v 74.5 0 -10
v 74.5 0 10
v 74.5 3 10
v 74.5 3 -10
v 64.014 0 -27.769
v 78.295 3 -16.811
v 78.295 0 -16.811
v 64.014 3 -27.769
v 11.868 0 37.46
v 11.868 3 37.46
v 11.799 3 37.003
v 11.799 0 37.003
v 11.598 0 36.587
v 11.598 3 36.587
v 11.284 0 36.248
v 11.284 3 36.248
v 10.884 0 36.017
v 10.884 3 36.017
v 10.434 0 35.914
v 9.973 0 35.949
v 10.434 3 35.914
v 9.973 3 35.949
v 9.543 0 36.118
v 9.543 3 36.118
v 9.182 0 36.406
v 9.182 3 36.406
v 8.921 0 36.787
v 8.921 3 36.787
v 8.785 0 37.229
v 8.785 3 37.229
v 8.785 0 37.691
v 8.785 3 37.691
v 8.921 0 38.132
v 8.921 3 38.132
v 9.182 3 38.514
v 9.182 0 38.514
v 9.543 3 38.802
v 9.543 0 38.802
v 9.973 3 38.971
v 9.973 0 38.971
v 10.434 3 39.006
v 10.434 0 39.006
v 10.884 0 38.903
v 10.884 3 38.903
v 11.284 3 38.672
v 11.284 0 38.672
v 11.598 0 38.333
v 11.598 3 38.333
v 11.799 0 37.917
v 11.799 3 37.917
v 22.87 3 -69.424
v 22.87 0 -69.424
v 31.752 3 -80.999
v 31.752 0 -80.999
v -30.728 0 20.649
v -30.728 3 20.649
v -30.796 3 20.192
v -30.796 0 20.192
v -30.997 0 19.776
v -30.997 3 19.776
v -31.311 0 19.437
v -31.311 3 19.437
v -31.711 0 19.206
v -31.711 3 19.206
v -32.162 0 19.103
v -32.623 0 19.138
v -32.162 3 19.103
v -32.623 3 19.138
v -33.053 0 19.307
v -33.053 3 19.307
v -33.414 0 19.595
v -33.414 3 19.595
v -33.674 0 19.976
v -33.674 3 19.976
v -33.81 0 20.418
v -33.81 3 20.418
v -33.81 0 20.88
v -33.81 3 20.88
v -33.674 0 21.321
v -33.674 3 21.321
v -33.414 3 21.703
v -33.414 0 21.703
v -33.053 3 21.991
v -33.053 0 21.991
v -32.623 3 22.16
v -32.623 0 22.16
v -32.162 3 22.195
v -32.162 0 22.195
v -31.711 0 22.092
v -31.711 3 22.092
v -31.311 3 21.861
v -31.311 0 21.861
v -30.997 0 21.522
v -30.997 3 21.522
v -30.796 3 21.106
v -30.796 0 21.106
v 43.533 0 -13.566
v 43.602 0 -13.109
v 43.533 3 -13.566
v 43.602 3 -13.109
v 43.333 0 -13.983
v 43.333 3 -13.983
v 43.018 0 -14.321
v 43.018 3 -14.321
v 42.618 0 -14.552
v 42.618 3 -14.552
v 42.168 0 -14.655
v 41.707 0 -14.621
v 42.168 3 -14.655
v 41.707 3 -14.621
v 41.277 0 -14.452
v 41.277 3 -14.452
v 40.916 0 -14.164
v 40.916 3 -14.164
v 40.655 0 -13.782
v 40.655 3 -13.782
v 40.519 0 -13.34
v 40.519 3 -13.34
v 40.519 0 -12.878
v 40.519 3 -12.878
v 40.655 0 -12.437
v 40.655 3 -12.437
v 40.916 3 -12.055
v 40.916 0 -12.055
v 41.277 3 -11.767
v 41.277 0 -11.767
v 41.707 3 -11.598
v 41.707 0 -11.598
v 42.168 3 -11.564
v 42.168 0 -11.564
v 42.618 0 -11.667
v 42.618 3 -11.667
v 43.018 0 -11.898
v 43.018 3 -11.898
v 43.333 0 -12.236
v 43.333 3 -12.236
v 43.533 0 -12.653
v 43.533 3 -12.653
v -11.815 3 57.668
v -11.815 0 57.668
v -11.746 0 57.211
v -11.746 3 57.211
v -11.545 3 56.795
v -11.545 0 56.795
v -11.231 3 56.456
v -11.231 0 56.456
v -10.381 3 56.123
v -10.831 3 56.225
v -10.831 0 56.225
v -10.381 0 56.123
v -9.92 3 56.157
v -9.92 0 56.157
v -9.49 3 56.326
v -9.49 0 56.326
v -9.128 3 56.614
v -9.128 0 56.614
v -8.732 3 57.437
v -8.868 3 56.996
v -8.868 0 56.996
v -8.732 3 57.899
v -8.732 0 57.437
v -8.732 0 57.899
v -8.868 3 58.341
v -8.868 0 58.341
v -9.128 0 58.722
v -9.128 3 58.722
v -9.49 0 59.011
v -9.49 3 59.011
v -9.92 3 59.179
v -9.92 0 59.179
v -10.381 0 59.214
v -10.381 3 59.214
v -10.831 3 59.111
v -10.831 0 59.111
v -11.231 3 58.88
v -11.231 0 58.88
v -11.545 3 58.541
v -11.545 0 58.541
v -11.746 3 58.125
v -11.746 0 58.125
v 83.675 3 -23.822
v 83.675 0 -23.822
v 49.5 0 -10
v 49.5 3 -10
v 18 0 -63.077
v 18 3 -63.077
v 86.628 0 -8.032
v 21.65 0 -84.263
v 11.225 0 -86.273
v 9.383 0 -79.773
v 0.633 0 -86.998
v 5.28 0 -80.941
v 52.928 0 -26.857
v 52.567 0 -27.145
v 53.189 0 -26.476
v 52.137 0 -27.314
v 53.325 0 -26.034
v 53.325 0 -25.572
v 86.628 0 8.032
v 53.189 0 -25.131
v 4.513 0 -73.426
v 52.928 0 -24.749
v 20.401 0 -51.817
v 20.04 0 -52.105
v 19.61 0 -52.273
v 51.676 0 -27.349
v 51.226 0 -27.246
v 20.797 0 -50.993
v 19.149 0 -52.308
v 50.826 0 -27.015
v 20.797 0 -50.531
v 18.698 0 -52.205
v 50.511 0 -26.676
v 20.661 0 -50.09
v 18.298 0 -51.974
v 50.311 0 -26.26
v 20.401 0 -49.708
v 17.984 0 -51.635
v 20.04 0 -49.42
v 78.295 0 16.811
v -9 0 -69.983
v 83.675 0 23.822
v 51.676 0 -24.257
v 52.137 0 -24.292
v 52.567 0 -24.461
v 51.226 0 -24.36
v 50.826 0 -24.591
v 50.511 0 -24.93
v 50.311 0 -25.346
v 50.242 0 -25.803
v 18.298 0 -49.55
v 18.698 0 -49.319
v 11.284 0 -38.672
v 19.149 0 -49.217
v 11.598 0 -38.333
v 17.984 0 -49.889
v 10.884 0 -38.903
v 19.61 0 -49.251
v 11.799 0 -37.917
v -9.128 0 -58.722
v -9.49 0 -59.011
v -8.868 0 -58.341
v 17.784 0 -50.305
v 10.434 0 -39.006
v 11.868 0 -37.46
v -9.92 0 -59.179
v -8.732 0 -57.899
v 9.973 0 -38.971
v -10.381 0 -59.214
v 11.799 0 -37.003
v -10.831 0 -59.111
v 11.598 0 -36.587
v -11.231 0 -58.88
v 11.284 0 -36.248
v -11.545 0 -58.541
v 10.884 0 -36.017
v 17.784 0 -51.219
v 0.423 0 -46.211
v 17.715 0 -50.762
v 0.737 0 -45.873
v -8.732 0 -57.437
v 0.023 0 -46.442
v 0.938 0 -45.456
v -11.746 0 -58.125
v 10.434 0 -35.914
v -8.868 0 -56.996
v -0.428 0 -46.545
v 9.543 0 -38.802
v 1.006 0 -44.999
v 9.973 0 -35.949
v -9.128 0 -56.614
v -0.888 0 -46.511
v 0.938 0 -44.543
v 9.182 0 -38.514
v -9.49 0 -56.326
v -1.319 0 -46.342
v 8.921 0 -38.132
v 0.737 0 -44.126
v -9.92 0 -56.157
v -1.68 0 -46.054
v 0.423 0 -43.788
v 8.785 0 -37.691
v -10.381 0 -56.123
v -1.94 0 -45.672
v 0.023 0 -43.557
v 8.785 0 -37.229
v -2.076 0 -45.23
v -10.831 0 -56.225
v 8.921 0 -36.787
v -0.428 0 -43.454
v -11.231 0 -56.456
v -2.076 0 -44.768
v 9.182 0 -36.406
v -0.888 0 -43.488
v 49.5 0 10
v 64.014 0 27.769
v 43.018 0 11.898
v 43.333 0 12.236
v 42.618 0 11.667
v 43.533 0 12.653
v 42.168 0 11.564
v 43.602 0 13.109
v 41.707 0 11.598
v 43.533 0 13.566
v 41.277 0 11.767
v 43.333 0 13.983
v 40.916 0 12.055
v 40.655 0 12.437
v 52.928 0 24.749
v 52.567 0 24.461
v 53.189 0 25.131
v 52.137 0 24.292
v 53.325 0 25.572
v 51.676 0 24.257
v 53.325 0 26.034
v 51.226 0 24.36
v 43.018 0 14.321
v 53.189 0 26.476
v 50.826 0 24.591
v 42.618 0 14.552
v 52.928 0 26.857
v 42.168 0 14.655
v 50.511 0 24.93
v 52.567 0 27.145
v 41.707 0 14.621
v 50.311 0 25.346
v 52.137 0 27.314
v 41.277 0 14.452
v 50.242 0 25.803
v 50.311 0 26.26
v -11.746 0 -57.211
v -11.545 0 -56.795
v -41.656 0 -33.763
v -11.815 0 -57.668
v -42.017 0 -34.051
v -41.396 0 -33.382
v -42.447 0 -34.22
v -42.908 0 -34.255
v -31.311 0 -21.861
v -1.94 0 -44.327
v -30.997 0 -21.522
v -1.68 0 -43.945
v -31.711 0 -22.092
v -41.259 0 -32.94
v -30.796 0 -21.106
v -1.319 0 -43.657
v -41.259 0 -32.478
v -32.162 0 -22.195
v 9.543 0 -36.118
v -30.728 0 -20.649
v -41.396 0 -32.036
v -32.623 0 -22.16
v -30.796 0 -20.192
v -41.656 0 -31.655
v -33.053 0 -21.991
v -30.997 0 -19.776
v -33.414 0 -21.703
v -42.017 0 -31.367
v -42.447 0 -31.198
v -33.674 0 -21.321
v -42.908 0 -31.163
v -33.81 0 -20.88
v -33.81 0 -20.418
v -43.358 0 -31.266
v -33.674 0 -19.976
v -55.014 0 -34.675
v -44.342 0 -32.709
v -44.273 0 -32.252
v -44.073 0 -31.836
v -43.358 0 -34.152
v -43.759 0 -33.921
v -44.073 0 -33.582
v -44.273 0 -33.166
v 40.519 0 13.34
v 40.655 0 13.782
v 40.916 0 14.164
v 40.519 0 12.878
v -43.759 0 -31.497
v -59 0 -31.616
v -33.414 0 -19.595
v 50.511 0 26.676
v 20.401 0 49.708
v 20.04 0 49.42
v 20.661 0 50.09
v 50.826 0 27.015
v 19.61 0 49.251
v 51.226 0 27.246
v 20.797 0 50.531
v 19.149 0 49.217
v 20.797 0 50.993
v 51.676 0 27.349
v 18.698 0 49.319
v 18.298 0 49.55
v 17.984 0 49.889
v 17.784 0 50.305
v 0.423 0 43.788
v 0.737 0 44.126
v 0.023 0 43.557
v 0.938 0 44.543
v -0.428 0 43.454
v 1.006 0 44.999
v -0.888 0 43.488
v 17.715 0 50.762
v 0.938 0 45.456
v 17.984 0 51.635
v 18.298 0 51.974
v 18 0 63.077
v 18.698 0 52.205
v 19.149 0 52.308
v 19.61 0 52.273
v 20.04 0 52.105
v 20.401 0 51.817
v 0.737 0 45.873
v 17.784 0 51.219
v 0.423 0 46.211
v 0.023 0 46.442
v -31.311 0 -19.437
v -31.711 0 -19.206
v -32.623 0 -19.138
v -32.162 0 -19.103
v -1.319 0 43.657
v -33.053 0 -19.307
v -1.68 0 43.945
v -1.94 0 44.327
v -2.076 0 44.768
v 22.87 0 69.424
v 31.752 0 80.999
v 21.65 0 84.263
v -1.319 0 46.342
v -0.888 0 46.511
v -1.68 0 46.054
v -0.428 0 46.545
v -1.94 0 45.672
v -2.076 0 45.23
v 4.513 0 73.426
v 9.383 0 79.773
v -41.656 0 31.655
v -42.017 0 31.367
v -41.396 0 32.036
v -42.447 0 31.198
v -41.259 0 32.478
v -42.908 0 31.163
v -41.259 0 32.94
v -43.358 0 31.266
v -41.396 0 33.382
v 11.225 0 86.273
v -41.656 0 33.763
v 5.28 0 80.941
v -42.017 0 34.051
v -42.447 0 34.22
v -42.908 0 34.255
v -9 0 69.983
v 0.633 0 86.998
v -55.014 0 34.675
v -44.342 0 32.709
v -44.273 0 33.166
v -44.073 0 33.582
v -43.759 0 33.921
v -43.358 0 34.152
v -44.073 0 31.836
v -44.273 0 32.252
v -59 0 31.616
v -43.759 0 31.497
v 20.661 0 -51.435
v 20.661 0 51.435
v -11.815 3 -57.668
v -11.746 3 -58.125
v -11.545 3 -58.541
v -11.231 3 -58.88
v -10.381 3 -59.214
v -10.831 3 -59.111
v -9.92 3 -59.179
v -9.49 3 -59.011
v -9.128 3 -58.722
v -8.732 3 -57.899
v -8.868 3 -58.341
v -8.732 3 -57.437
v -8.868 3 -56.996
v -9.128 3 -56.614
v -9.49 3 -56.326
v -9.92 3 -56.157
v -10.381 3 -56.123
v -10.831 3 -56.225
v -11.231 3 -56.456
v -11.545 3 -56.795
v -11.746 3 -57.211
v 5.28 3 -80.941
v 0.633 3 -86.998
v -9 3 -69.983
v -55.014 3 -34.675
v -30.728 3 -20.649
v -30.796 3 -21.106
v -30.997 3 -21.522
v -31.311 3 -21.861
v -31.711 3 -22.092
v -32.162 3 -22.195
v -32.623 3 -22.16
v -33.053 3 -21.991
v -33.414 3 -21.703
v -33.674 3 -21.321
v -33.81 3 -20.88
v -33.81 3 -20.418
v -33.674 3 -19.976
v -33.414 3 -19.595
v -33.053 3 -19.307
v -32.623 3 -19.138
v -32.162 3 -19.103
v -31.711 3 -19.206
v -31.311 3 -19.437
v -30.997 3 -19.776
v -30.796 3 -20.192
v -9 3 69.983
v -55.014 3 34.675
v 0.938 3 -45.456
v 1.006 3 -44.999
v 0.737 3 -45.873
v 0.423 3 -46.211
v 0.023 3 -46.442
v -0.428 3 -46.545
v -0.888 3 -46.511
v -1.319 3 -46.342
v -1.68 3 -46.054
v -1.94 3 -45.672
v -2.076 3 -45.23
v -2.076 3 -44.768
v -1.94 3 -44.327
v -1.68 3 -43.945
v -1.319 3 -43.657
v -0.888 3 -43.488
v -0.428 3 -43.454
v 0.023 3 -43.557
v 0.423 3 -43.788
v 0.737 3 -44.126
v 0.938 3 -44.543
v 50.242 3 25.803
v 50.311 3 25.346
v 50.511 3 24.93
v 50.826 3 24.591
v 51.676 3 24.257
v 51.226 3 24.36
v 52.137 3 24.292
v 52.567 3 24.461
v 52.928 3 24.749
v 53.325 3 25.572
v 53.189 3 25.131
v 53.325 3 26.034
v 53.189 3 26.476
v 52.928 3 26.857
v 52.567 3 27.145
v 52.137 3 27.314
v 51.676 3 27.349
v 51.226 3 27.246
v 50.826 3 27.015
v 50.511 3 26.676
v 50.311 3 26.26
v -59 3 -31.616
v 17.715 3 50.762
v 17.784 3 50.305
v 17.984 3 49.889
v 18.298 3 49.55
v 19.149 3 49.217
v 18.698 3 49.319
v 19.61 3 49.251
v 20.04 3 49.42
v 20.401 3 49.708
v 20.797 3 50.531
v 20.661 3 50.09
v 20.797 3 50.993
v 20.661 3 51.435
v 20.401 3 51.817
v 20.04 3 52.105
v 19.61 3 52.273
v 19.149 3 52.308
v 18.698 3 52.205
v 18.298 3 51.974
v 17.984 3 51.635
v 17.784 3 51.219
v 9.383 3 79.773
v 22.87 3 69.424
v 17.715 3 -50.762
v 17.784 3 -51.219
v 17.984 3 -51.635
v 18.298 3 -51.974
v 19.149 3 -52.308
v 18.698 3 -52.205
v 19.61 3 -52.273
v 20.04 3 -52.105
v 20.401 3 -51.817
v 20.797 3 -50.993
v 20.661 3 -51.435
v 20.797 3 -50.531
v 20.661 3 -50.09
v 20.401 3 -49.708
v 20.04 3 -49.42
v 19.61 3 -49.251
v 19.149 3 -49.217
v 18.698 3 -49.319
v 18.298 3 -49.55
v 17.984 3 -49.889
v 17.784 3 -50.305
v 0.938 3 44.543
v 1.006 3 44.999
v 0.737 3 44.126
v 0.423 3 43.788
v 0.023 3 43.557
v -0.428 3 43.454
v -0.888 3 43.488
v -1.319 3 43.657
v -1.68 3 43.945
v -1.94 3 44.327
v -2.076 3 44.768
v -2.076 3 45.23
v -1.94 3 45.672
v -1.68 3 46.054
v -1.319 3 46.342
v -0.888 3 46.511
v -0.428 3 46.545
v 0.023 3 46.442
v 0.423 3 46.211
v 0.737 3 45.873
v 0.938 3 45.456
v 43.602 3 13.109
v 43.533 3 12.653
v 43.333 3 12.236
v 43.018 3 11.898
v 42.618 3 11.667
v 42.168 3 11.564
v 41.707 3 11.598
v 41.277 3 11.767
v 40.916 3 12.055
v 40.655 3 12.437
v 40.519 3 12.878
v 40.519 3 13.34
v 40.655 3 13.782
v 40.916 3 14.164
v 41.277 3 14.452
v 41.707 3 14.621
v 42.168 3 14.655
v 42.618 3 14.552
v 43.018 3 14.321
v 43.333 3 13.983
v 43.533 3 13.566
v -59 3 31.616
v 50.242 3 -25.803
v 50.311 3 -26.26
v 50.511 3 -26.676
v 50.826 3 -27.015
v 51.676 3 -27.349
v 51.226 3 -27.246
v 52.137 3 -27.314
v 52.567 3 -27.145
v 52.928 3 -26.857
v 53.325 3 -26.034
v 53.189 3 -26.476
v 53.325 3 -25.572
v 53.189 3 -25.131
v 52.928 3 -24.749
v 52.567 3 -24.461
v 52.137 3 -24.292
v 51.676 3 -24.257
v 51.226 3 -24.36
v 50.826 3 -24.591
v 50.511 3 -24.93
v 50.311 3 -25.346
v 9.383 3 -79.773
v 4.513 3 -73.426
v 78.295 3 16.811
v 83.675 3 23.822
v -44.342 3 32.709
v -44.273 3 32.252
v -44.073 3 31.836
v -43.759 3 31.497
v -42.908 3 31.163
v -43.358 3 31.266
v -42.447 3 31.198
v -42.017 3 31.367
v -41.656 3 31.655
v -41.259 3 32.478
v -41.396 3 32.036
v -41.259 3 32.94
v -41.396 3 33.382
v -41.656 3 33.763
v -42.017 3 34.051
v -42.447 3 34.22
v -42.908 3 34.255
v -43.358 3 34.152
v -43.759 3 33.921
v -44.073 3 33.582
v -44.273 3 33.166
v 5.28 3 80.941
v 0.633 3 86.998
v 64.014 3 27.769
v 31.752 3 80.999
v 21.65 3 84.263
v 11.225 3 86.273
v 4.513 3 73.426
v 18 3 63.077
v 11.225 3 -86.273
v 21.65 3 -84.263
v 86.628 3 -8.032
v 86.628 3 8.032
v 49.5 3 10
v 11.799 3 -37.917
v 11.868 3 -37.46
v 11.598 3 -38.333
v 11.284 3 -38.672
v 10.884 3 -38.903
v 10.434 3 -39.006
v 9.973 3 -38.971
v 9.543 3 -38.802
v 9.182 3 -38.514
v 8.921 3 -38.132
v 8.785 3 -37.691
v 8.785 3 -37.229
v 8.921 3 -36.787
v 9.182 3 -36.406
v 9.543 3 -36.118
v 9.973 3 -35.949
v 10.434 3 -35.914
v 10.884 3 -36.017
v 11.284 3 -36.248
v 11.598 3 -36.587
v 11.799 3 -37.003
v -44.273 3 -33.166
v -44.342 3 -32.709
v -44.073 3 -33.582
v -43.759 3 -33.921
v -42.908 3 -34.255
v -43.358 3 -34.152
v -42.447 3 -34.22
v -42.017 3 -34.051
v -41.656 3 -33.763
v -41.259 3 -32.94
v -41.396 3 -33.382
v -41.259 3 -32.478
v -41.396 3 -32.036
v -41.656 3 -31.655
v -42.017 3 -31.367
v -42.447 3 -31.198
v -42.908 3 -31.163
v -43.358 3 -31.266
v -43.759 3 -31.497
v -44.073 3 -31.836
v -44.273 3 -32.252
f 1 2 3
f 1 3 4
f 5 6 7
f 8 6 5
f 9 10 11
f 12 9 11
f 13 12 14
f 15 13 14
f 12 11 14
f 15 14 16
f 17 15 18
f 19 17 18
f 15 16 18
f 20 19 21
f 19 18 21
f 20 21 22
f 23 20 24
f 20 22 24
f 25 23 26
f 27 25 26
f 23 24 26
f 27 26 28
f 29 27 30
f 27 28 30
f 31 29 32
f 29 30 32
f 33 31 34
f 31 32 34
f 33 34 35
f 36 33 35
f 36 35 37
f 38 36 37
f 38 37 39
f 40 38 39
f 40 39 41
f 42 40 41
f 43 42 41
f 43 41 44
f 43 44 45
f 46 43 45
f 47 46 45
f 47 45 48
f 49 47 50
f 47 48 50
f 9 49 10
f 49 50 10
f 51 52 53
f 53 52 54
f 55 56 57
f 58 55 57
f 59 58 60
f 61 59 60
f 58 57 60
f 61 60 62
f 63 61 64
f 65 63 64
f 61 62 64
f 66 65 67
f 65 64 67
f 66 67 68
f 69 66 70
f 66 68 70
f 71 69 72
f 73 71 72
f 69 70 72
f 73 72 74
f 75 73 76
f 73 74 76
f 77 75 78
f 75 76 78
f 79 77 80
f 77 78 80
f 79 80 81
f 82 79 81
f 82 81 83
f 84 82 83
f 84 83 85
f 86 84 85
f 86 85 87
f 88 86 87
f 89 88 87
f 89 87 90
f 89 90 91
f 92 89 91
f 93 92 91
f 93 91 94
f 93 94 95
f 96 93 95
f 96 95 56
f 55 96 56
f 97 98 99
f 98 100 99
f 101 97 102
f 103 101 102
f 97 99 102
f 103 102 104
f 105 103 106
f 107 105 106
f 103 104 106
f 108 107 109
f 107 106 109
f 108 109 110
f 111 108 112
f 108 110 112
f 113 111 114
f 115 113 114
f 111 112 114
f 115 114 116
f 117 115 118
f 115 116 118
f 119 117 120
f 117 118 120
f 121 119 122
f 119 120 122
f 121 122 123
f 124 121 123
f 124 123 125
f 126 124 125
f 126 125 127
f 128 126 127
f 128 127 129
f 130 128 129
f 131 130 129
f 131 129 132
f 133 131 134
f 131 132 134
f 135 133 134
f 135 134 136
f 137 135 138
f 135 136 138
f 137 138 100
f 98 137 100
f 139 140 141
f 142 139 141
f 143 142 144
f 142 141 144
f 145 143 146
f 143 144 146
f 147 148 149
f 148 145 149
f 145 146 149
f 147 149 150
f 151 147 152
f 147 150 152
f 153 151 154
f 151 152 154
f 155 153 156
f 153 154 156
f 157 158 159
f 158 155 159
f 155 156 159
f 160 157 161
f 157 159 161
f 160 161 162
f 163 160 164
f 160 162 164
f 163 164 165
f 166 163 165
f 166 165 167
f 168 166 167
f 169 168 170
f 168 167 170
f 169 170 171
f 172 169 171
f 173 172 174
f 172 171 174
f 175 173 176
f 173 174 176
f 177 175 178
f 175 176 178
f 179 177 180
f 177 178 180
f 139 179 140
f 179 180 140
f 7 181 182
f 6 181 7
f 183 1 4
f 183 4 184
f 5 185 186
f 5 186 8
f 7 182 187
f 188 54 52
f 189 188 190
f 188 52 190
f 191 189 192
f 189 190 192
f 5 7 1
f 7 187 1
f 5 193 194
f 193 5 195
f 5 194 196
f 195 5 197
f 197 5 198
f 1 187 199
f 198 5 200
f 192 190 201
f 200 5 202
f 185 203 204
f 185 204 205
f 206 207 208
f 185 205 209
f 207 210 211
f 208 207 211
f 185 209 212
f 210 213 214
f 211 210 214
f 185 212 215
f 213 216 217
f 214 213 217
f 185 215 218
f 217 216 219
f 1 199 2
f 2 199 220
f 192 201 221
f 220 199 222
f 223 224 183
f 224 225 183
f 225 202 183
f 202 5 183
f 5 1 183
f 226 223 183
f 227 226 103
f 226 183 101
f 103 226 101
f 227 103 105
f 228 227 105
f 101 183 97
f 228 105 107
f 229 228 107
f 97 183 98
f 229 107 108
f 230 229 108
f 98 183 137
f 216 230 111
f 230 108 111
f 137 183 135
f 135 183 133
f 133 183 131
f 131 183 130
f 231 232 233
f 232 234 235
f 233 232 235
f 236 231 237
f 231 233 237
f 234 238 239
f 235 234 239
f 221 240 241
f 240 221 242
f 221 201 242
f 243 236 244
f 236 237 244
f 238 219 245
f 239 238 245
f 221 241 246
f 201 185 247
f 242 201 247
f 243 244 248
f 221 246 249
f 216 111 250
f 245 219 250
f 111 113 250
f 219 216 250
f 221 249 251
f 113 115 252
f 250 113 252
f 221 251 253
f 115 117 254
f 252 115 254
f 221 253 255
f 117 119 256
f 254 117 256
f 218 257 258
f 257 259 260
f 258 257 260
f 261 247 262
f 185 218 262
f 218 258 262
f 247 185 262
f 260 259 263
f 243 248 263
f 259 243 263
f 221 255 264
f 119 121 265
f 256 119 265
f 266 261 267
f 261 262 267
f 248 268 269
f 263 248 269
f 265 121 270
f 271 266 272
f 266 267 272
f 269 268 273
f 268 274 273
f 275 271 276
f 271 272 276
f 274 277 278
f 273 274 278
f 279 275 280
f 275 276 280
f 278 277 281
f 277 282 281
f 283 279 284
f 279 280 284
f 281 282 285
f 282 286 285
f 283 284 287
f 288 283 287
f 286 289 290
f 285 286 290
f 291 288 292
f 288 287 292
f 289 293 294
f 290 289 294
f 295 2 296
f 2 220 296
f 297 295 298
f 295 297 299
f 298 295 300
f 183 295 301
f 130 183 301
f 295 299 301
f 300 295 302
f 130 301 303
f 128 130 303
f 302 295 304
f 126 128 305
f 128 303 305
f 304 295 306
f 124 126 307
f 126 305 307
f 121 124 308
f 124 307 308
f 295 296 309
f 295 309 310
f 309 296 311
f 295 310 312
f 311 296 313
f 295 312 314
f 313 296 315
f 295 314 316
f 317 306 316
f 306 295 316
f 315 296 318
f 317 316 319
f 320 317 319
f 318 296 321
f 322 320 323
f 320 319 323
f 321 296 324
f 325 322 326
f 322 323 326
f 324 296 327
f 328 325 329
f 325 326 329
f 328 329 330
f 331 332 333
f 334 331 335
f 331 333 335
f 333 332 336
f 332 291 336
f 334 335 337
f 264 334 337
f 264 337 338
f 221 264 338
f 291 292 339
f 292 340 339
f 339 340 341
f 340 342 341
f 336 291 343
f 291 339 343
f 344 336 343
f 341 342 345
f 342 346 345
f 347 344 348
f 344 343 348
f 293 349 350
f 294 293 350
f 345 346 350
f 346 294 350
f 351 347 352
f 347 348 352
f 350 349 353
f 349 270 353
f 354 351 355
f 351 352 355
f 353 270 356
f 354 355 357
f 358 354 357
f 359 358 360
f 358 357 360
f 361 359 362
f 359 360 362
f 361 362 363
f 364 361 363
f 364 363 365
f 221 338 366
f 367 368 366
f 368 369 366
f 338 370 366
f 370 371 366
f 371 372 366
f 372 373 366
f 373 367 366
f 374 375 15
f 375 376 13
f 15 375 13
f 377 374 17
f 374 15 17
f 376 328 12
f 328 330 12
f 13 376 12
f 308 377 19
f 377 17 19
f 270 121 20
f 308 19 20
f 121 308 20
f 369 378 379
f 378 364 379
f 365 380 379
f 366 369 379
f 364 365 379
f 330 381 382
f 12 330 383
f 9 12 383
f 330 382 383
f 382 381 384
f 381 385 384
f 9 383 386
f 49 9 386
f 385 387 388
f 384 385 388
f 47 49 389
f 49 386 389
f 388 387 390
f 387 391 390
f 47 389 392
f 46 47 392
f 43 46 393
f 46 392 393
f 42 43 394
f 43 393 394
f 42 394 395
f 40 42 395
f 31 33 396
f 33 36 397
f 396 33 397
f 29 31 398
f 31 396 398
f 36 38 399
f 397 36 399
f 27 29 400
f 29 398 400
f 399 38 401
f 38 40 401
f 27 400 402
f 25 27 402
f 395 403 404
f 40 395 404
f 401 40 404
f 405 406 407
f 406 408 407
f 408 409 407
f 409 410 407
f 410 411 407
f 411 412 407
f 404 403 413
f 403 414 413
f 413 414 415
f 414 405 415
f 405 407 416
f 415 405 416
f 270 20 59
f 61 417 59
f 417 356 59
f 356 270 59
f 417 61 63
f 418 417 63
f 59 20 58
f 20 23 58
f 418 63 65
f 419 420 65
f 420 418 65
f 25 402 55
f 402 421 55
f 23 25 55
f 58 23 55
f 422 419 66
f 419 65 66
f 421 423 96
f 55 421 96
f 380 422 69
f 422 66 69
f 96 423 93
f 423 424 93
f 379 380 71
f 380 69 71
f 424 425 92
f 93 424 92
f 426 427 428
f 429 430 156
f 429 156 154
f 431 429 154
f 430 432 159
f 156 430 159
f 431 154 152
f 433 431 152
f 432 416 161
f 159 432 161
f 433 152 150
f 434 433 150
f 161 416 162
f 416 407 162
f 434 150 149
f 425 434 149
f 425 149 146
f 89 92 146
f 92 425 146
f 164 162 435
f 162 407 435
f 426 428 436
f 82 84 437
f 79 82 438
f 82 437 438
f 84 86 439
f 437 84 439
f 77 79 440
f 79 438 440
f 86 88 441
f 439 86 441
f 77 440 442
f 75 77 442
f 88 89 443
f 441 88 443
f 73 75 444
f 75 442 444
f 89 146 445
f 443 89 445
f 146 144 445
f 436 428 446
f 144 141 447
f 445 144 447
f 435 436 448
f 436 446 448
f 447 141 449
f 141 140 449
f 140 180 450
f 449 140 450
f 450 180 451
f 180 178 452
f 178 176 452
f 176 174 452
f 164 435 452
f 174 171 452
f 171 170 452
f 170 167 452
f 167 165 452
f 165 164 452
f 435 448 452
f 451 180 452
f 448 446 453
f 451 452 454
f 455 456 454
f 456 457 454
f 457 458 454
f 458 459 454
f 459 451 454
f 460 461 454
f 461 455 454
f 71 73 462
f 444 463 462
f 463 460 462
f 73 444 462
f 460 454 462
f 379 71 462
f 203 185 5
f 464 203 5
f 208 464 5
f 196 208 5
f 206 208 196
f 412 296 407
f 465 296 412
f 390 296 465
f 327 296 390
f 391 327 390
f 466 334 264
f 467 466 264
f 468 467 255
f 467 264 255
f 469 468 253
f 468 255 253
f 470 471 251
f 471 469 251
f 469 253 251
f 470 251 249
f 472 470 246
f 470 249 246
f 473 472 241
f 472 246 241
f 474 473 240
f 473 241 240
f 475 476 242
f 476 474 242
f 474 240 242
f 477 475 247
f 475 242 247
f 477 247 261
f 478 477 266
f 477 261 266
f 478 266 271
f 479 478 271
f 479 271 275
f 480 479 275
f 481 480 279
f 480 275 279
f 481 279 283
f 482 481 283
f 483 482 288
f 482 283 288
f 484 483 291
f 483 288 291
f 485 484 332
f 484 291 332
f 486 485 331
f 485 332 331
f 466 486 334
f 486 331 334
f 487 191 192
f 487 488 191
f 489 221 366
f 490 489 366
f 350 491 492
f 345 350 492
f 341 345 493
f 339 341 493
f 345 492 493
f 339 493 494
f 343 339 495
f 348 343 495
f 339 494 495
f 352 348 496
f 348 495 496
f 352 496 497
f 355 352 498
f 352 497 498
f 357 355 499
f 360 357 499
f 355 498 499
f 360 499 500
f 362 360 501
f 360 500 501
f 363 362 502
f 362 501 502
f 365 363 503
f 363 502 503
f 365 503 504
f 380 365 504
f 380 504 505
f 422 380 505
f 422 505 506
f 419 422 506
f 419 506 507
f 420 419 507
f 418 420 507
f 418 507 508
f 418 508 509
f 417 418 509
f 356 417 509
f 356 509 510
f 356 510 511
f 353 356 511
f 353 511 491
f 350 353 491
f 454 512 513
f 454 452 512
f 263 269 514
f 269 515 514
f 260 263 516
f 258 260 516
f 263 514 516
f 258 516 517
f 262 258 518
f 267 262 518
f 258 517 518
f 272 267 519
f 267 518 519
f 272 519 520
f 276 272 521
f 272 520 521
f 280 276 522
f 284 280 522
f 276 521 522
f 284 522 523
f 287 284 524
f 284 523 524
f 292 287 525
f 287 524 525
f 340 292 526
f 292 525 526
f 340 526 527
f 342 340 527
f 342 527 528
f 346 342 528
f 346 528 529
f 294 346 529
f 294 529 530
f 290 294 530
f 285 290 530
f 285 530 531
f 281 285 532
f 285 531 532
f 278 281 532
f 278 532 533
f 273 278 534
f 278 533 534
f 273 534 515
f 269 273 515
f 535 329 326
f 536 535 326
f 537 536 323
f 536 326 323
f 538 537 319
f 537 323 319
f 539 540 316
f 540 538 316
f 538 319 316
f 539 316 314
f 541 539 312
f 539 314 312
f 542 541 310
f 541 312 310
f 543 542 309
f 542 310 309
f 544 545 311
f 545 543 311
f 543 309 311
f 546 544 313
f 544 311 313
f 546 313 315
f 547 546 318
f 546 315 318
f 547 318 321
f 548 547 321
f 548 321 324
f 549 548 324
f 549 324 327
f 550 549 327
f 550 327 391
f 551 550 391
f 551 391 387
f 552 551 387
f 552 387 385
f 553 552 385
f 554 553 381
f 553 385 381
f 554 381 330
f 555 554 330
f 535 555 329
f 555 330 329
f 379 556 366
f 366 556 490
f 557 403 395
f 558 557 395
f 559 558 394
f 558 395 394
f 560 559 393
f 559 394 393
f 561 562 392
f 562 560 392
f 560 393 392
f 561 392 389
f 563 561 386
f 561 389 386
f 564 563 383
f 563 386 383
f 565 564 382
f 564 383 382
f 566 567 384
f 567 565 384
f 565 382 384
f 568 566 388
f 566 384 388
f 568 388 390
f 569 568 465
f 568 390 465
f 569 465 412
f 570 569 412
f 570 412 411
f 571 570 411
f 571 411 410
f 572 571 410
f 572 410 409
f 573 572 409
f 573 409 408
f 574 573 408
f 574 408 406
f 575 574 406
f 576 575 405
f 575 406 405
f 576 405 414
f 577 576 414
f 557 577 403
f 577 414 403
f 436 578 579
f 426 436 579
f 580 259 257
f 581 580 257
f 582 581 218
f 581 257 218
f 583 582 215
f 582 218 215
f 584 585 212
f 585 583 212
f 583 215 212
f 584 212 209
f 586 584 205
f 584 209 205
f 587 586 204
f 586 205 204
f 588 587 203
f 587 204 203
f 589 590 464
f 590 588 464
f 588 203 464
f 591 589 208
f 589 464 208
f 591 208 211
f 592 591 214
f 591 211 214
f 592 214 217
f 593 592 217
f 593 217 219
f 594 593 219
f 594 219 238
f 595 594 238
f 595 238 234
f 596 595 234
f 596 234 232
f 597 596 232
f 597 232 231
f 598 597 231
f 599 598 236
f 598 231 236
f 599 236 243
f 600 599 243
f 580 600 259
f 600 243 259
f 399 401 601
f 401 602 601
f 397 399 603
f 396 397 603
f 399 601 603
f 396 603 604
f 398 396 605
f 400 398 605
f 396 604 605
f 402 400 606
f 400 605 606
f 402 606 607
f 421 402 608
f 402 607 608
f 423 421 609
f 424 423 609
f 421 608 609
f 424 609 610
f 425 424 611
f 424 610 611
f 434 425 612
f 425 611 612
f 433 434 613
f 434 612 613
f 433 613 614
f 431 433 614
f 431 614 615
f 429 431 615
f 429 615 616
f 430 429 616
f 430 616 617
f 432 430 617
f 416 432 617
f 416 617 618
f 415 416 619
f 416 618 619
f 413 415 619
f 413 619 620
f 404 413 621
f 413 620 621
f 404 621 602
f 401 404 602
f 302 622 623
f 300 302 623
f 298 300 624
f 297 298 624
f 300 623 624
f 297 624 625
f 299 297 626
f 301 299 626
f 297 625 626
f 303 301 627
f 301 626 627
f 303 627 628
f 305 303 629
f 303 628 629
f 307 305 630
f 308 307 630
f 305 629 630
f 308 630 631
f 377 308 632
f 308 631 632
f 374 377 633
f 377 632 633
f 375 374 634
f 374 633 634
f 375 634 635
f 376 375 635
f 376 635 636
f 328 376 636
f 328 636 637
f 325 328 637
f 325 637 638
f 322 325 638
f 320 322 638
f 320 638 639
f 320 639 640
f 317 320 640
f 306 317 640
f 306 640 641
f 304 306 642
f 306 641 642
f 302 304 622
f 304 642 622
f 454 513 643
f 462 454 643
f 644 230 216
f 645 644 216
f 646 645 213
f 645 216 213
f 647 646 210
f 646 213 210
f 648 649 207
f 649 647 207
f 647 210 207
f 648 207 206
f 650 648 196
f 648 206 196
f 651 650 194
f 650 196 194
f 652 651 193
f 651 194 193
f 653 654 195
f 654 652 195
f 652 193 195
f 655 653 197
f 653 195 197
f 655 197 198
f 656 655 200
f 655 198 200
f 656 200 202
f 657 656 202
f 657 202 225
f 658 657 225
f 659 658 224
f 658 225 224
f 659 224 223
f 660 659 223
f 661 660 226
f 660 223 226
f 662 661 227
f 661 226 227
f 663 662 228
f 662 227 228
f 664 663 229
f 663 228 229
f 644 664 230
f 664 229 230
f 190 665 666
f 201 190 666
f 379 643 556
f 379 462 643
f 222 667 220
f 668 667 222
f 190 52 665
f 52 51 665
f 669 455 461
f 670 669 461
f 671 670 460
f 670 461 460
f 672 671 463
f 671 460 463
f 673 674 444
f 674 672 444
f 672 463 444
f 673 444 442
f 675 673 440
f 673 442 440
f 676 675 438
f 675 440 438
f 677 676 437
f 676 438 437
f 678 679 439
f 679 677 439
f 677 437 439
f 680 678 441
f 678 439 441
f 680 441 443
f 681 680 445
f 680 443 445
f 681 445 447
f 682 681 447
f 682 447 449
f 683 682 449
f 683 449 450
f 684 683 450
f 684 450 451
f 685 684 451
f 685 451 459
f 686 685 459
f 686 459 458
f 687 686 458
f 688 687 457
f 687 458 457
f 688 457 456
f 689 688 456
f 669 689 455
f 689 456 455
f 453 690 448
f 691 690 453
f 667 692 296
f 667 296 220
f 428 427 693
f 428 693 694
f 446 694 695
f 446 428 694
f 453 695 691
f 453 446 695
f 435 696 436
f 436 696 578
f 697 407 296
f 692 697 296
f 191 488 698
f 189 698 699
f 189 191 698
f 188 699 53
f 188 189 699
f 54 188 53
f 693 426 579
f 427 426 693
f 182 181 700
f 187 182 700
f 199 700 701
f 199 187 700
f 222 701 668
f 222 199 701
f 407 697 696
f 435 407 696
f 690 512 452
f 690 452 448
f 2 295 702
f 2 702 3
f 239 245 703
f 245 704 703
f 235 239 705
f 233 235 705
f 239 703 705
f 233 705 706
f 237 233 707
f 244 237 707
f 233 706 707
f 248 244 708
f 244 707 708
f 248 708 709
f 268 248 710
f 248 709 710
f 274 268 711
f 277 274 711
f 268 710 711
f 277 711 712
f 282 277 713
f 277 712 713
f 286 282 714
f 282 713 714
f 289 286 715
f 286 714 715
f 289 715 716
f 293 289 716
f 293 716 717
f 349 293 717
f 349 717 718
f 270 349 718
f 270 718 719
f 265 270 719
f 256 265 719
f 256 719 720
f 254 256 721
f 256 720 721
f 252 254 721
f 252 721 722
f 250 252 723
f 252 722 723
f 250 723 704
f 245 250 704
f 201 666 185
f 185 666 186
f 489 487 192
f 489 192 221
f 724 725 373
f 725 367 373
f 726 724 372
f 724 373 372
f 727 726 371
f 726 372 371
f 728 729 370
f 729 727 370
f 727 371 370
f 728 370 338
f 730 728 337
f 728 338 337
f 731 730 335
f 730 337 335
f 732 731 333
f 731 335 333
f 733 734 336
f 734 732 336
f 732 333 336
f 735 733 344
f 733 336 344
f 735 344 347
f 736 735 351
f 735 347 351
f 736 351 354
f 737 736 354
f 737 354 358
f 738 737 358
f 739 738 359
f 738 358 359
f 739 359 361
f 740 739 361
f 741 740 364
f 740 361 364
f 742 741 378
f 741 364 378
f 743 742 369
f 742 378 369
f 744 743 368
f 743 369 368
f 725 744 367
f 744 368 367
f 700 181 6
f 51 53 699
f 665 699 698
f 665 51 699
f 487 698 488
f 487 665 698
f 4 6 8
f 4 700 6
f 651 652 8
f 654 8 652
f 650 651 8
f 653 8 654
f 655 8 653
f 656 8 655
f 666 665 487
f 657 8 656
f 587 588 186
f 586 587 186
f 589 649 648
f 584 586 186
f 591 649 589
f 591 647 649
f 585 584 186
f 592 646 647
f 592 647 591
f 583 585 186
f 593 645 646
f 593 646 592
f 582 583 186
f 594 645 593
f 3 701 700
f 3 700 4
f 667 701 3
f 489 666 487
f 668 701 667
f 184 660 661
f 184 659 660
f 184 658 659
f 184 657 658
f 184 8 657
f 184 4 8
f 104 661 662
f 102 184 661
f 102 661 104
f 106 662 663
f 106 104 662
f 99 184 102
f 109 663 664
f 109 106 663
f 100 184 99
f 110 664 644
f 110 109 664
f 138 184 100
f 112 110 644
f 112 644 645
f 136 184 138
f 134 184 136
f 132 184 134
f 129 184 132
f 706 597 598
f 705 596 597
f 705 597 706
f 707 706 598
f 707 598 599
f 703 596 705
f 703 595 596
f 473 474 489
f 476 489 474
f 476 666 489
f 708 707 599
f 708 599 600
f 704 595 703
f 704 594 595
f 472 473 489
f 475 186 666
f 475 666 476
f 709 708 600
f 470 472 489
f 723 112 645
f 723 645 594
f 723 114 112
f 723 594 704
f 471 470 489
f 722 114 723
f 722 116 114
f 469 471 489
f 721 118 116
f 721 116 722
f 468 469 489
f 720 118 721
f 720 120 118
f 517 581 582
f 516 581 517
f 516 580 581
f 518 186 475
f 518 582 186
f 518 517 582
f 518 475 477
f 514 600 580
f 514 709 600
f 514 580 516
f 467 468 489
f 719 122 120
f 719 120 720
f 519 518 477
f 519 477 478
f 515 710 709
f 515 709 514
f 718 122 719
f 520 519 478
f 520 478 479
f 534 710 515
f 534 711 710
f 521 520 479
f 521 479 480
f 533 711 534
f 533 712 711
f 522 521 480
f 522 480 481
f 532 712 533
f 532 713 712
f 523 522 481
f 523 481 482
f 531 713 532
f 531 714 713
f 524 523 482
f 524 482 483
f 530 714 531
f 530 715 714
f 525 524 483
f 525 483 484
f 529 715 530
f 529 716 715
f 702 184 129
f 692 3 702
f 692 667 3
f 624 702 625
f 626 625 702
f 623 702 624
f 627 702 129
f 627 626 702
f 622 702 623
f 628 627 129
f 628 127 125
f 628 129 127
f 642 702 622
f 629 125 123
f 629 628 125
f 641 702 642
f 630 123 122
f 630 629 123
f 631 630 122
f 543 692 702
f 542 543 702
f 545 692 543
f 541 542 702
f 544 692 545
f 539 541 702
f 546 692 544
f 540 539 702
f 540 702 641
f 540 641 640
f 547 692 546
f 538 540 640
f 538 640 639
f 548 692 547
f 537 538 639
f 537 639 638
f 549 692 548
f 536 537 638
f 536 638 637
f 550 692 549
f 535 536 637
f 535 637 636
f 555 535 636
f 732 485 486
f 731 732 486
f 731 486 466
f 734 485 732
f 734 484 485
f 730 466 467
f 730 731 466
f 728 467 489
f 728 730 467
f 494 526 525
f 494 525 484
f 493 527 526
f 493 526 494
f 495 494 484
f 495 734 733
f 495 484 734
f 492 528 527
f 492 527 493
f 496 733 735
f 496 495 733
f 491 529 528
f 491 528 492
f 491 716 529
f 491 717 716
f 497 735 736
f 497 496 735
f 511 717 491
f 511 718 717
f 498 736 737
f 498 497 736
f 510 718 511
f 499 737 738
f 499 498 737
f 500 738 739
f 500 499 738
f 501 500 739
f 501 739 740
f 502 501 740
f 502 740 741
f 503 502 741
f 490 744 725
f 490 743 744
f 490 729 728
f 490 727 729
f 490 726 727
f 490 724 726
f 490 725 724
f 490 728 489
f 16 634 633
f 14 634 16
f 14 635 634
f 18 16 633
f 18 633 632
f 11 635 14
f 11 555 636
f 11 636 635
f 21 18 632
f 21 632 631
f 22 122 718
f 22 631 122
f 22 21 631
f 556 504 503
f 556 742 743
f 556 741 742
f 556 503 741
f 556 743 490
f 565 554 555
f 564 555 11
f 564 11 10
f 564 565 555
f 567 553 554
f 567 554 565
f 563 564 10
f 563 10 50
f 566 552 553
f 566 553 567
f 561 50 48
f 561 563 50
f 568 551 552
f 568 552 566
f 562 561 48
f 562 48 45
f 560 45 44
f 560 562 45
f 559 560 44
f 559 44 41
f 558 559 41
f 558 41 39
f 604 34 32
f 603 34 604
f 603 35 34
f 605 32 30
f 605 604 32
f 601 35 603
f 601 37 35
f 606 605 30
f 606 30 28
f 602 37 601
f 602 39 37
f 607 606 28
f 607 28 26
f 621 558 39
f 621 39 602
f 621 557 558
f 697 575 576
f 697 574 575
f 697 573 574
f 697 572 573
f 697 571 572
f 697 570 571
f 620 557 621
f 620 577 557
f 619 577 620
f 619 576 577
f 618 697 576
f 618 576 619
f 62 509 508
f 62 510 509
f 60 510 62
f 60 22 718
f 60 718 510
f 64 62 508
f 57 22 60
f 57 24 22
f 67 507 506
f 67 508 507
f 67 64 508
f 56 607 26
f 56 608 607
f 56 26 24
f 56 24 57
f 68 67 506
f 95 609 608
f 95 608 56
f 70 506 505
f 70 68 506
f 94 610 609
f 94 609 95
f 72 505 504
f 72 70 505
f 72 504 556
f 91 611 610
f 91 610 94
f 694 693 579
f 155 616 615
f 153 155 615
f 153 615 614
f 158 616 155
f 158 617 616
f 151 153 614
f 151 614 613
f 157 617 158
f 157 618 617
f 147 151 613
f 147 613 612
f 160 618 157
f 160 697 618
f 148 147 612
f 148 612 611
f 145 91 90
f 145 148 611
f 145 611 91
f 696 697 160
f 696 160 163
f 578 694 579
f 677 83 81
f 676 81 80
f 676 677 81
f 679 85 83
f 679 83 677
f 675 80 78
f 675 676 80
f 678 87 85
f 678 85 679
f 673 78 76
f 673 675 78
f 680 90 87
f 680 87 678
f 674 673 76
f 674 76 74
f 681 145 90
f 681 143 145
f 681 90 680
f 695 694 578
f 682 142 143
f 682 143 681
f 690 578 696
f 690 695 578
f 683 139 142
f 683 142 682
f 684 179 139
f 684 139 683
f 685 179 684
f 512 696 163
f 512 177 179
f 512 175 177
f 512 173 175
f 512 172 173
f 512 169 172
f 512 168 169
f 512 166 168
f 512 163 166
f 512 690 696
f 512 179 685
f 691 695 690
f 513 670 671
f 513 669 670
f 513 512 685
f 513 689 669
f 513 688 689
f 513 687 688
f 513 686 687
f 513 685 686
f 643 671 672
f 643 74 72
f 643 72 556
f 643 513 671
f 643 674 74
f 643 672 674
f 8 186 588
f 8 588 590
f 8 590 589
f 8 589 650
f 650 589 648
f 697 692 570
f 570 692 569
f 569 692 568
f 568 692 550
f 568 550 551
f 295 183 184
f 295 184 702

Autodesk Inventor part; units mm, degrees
ref_plane "YZ Plane" through (0, 0, 0) normal (1, 0, 0) x (0, 1, 0)
ref_plane "XZ Plane" through (0, 0, 0) normal (0, 1, 0) x (-1, 0, 0)
ref_plane "XY Plane" through (0, 0, 0) normal (0, 0, 1) x (1, 0, 0)
sketch "Boceto1" plane through (0, 0, 0) normal (0, 1, 0) x (-1, 0, 0)
  line L0 (0, 0) -> (0, -87) construction
  line L1 (0, 0) -> (0, 83.8978) construction
  line L2 (0, 0) -> (-87, 0) construction
  line L3 (0, 0) -> (59, 0) construction
  line L4 (-74.5, -10) -> (-49.5, -10)
  line L5 (-49.5, -10) -> (-49.5, 10)
  line L6 (-49.5, 10) -> (-74.5, 10)
  line L7 (-74.5, 10) -> (-74.5, -10)
  line L8 (-74.5, -10) -> (-49.5, 10) construction
  line L9 (-49.5, -10) -> (-74.5, 10) construction
  line L10 (-18, 63.0769) -> (-64.0145, 27.7688)
  line L11 (9, 69.9829) -> (55.0145, 34.6747)
  line L12 (9, 69.9829) -> (20.2282, 84.6157)
  line L13 (-18, 63.0769) -> (-31.752, 80.9988)
  line L14 (-64.0145, 27.7688) -> (-75.6609, 42.9467)
  line L15 (-18, -63.0769) -> (-64.0145, -27.7688)
  line L16 (9, -69.9829) -> (55.0145, -34.6747)
  line L17 (9, -69.9829) -> (20.2282, -84.6157)
  line L18 (-18, -63.0769) -> (-31.752, -80.9988)
  line L19 (-64.0145, -27.7688) -> (-75.6609, -42.9467)
  arc A0 (-75.6609, 42.9467) -> (-75.6609, -42.9467) centre (0, 0) ccw
  arc A1 (20.2282, 84.6157) -> (-31.752, 80.9988) centre (0, 0) ccw
  arc A2 (-31.752, -80.9988) -> (20.2282, -84.6157) centre (0, 0) ccw
  line L20 (59, 37.9189) -> (59, -37.9189)
  line L21 (58.0583, 38.6415) -> (59, 37.9189)
  line L22 (55.0145, 34.6747) -> (58.0583, 38.6415)
  line L23 (58.0583, -38.6415) -> (59, -37.9189)
  line L24 (55.0145, -34.6747) -> (58.0583, -38.6415)
  circle A3 centre (-19.2647, 50.7623) radius 1.55
  circle A4 centre (-51.7921, 25.8031) radius 1.55
  line L25 (-41.0072, 45.4229) -> (-35.5284, 38.2827) construction
  line L26 (-19.2647, 50.7623) -> (-51.7921, 25.8031) construction
  line L27 (32.0072, 52.3288) -> (22.9685, 40.5493) construction
  circle A5 centre (10.2647, 57.6682) radius 1.55
  circle A6 centre (42.7921, 32.709) radius 1.55
  circle A7 centre (-19.2647, -50.7623) radius 1.55
  circle A8 centre (-51.7921, -25.8031) radius 1.55
  circle A9 centre (10.2647, -57.6682) radius 1.55
  circle A10 centre (42.7921, -32.709) radius 1.55
  line L28 (42.7921, 32.709) -> (10.2647, 57.6682) construction
  point P0 (-62, 0)
  point P1 (-74.5, 0)
  point P2 (26.5284, 45.1886)
  dimension "d1" = 25
  dimension "d2" = 20
  dimension "d9" = 52.5
  dimension "d10" = 52.5
  dimension "d11" = 61
  dimension "d12" = 61
  dimension "d13" = 58
  dimension "d17" = 90
  dimension "d18" = 9
  dimension "d19" = 18
  dimension "d20" = 58
  dimension "d21" = 90
  dimension "d22" = 90
  dimension "d23" = 87
  dimension "d24" = 87
  dimension "d26" = 59
  dimension "d27" = 5
  dimension "d28" = 5
  dimension "d29" = 3.1
  dimension "d30" = 3.1
  dimension "d31" = 41
  dimension "d32" = 9
  dimension "d37" = 90
  dimension "d38" = 3.1
  dimension "d39" = 3.1
  dimension "d40" = 41
  dimension "d41" = 9
  dimension "d54" = 62
extrude "Extrusión1" add sketch "Boceto1" along normal blind 3
sketch "Boceto2" plane through (0, 3, 0) normal (0, 1, 0) x (1, 0, 0)
  line L0 (-9, -69.9829) -> (-55.0145, -34.6747) projected
  line L1 (-32.0072, -52.3288) -> (-0.1642, -10.8301) construction
  circle A0 centre (-32.2776, -20.6489) radius 1.55
  circle A1 centre (-0.5435, -44.9994) radius 1.55
  line L2 (-32.2776, -20.6489) -> (-0.5435, -44.9994) construction
  circle A2 centre (-42.7921, -32.709) radius 1.55 construction
  line L3 (64.0145, -27.7688) -> (18, -63.0769) projected
  line L4 (41.0072, -45.4229) -> (14.3892, -10.7335) construction
  circle A3 centre (10.3178, -37.4599) radius 1.55
  circle A4 centre (42.052, -13.1094) radius 1.55
  line L5 (42.052, -13.1094) -> (10.3178, -37.4599) construction
  circle A5 centre (19.2647, -50.7623) radius 1.55 construction
  line L6 (-59, 37.9189) -> (-59, -37.9189) construction
  line L7 (-59, 0) -> (115.874, 0) construction
  circle A6 centre (-32.2776, 20.6489) radius 1.55
  circle A7 centre (-0.5435, 44.9994) radius 1.55
  circle A8 centre (10.3178, 37.4599) radius 1.55
  circle A9 centre (42.052, 13.1094) radius 1.55
  point P0 (0, 0)
  dimension "d44" = 3.1
  dimension "d45" = 3.1
  dimension "d46" = 19.5
  dimension "d47" = 40
  dimension "d48" = 16
  dimension "d51" = 16
  dimension "d52" = 19.5
  dimension "d53" = 40
extrude "Extrusión2" cut sketch "Boceto2" against normal blind 10
sketch "Boceto3" plane through (0, 3, 0) normal (0, 1, 0) x (1, 0, 0)
  circle A0 centre (0, 0) radius 90 construction
  dimension "d55" = 180
sketch "Boceto5" plane through (0, 3, 0) normal (0, 1, 0) x (1, 0, 0)
  arc A0 (75.6609, 42.9467) -> (75.6609, -42.9467) centre (0, 0) ccw construction
  line L0 (87, 0) -> (-107.1861, 0) construction
  line L1 (-9, -69.9829) -> (-55.0145, -34.6747) projected
  line L2 (-9, -69.9829) -> (5.2804, -80.9406)
  line L3 (5.2804, -80.9406) -> (0.6326, -86.9977)
  arc A1 (31.752, -80.9988) -> (-20.2282, -84.6157) centre (0, 0) ccw projected
  line L4 (18, -63.0769) -> (31.752, -80.9988) projected
  line L5 (18, -63.0769) -> (4.513, -73.4259)
  line L6 (4.513, -73.4259) -> (9.3831, -79.7727)
  line L7 (9.3831, -79.7727) -> (22.8701, -69.4238)
  line L8 (-55.0145, -34.6747) -> (-59, -31.6165)
  line L9 (-59, -37.9189) -> (-59, 37.9189) projected
  circle A2 centre (42.052, 13.1094) radius 1.55 projected
  circle A3 centre (-32.2776, -20.6489) radius 1.55 projected
  circle A4 centre (-32.2776, 20.6489) radius 1.55 projected
  circle A5 centre (42.052, -13.1094) radius 1.55 projected
  circle A6 centre (10.3178, 37.4599) radius 1.55 projected
  circle A7 centre (-0.5435, -44.9994) radius 1.55 projected
  circle A8 centre (-0.5435, 44.9994) radius 1.55 projected
  circle A9 centre (10.3178, -37.4599) radius 1.55 projected
  arc A10 (-20.2282, -84.6157) -> (31.752, -80.9988) centre (0, 0) ccw projected
  line L10 (18, -63.0769) -> (31.752, -80.9988) projected
  line L11 (64.0145, -27.7688) -> (18, -63.0769) projected
  line L12 (75.6609, -42.9467) -> (64.0145, -27.7688) projected
  arc A11 (75.6609, -42.9467) -> (75.6609, 42.9467) centre (0, 0) ccw projected
  line L13 (64.0145, 27.7688) -> (75.6609, 42.9467) projected
  line L14 (18, 63.0769) -> (64.0145, 27.7688) projected
  line L15 (31.752, 80.9988) -> (18, 63.0769) projected
  arc A12 (31.752, 80.9988) -> (-20.2282, 84.6157) centre (0, 0) ccw projected
  line L16 (-9, 69.9829) -> (-20.2282, 84.6157) projected
  line L17 (-55.0145, 34.6747) -> (-9, 69.9829) projected
  line L18 (-58.0583, 38.6415) -> (-55.0145, 34.6747) projected
  line L19 (-59, 37.9189) -> (-58.0583, 38.6415) projected
  line L20 (-59, -37.9189) -> (-59, 37.9189) projected
  line L21 (-58.0583, -38.6415) -> (-59, -37.9189) projected
  line L22 (-55.0145, -34.6747) -> (-58.0583, -38.6415) projected
  line L23 (-9, -69.9829) -> (-55.0145, -34.6747) projected
  line L24 (-20.2282, -84.6157) -> (-9, -69.9829) projected
  circle A13 centre (-42.7921, 32.709) radius 1.55 projected
  circle A14 centre (-10.2647, 57.6682) radius 1.55 projected
  circle A15 centre (19.2647, 50.7623) radius 1.55 projected
  circle A16 centre (51.7921, 25.8031) radius 1.55 projected
  circle A17 centre (-42.7921, -32.709) radius 1.55 projected
  circle A18 centre (-10.2647, -57.6682) radius 1.55 projected
  circle A19 centre (51.7921, -25.8031) radius 1.55 projected
  circle A20 centre (19.2647, -50.7623) radius 1.55 projected
  line L25 (74.5, -10) -> (74.5, 10) projected
  line L26 (49.5, -10) -> (74.5, -10) projected
  line L27 (49.5, 10) -> (49.5, -10) projected
  line L28 (74.5, 10) -> (49.5, 10) projected
  line L29 (64.0145, -27.7688) -> (18, -63.0769) projected
  line L30 (64.0145, -27.7688) -> (78.2949, -16.8111)
  line L31 (78.2949, -16.8111) -> (83.6749, -23.8225)
  point P0 (-55.0145, -34.6747)
  point P1 (-9, -69.9829)
  point P2 (-20.2282, -84.6157)
  point P3 (-20.2282, 84.6157)
  point P4 (31.752, -80.9988)
  point P5 (75.6609, 42.9467)
  point P6 (-20.2282, -84.6157)
  dimension "d66" = 18
  dimension "d67" = 17
  dimension "d68" = 8
  dimension "d69" = 18
extrude "Extrusión3" cut sketch "Boceto5" against normal blind 10 contours L24 A1 L16 L17 L18 L19 L9 L21 L22 L1 | L2 L3 A10 L24 | L22 L21 L9 L8 | L4 L11 L12 A1 | A1 L13 L14 L15 | L12 L30 L31 A1 | L7 L6 L5 L4
mirror "Simetría1" about plane through (0, 0, 0) normal (0, 0, 1) of "Extrusión3"
ref_plane "Plano de trabajo1" through (0, 0, 0) normal (0, 0, 1) x (1, 0, 0)
properties part number "newbasecentral"
